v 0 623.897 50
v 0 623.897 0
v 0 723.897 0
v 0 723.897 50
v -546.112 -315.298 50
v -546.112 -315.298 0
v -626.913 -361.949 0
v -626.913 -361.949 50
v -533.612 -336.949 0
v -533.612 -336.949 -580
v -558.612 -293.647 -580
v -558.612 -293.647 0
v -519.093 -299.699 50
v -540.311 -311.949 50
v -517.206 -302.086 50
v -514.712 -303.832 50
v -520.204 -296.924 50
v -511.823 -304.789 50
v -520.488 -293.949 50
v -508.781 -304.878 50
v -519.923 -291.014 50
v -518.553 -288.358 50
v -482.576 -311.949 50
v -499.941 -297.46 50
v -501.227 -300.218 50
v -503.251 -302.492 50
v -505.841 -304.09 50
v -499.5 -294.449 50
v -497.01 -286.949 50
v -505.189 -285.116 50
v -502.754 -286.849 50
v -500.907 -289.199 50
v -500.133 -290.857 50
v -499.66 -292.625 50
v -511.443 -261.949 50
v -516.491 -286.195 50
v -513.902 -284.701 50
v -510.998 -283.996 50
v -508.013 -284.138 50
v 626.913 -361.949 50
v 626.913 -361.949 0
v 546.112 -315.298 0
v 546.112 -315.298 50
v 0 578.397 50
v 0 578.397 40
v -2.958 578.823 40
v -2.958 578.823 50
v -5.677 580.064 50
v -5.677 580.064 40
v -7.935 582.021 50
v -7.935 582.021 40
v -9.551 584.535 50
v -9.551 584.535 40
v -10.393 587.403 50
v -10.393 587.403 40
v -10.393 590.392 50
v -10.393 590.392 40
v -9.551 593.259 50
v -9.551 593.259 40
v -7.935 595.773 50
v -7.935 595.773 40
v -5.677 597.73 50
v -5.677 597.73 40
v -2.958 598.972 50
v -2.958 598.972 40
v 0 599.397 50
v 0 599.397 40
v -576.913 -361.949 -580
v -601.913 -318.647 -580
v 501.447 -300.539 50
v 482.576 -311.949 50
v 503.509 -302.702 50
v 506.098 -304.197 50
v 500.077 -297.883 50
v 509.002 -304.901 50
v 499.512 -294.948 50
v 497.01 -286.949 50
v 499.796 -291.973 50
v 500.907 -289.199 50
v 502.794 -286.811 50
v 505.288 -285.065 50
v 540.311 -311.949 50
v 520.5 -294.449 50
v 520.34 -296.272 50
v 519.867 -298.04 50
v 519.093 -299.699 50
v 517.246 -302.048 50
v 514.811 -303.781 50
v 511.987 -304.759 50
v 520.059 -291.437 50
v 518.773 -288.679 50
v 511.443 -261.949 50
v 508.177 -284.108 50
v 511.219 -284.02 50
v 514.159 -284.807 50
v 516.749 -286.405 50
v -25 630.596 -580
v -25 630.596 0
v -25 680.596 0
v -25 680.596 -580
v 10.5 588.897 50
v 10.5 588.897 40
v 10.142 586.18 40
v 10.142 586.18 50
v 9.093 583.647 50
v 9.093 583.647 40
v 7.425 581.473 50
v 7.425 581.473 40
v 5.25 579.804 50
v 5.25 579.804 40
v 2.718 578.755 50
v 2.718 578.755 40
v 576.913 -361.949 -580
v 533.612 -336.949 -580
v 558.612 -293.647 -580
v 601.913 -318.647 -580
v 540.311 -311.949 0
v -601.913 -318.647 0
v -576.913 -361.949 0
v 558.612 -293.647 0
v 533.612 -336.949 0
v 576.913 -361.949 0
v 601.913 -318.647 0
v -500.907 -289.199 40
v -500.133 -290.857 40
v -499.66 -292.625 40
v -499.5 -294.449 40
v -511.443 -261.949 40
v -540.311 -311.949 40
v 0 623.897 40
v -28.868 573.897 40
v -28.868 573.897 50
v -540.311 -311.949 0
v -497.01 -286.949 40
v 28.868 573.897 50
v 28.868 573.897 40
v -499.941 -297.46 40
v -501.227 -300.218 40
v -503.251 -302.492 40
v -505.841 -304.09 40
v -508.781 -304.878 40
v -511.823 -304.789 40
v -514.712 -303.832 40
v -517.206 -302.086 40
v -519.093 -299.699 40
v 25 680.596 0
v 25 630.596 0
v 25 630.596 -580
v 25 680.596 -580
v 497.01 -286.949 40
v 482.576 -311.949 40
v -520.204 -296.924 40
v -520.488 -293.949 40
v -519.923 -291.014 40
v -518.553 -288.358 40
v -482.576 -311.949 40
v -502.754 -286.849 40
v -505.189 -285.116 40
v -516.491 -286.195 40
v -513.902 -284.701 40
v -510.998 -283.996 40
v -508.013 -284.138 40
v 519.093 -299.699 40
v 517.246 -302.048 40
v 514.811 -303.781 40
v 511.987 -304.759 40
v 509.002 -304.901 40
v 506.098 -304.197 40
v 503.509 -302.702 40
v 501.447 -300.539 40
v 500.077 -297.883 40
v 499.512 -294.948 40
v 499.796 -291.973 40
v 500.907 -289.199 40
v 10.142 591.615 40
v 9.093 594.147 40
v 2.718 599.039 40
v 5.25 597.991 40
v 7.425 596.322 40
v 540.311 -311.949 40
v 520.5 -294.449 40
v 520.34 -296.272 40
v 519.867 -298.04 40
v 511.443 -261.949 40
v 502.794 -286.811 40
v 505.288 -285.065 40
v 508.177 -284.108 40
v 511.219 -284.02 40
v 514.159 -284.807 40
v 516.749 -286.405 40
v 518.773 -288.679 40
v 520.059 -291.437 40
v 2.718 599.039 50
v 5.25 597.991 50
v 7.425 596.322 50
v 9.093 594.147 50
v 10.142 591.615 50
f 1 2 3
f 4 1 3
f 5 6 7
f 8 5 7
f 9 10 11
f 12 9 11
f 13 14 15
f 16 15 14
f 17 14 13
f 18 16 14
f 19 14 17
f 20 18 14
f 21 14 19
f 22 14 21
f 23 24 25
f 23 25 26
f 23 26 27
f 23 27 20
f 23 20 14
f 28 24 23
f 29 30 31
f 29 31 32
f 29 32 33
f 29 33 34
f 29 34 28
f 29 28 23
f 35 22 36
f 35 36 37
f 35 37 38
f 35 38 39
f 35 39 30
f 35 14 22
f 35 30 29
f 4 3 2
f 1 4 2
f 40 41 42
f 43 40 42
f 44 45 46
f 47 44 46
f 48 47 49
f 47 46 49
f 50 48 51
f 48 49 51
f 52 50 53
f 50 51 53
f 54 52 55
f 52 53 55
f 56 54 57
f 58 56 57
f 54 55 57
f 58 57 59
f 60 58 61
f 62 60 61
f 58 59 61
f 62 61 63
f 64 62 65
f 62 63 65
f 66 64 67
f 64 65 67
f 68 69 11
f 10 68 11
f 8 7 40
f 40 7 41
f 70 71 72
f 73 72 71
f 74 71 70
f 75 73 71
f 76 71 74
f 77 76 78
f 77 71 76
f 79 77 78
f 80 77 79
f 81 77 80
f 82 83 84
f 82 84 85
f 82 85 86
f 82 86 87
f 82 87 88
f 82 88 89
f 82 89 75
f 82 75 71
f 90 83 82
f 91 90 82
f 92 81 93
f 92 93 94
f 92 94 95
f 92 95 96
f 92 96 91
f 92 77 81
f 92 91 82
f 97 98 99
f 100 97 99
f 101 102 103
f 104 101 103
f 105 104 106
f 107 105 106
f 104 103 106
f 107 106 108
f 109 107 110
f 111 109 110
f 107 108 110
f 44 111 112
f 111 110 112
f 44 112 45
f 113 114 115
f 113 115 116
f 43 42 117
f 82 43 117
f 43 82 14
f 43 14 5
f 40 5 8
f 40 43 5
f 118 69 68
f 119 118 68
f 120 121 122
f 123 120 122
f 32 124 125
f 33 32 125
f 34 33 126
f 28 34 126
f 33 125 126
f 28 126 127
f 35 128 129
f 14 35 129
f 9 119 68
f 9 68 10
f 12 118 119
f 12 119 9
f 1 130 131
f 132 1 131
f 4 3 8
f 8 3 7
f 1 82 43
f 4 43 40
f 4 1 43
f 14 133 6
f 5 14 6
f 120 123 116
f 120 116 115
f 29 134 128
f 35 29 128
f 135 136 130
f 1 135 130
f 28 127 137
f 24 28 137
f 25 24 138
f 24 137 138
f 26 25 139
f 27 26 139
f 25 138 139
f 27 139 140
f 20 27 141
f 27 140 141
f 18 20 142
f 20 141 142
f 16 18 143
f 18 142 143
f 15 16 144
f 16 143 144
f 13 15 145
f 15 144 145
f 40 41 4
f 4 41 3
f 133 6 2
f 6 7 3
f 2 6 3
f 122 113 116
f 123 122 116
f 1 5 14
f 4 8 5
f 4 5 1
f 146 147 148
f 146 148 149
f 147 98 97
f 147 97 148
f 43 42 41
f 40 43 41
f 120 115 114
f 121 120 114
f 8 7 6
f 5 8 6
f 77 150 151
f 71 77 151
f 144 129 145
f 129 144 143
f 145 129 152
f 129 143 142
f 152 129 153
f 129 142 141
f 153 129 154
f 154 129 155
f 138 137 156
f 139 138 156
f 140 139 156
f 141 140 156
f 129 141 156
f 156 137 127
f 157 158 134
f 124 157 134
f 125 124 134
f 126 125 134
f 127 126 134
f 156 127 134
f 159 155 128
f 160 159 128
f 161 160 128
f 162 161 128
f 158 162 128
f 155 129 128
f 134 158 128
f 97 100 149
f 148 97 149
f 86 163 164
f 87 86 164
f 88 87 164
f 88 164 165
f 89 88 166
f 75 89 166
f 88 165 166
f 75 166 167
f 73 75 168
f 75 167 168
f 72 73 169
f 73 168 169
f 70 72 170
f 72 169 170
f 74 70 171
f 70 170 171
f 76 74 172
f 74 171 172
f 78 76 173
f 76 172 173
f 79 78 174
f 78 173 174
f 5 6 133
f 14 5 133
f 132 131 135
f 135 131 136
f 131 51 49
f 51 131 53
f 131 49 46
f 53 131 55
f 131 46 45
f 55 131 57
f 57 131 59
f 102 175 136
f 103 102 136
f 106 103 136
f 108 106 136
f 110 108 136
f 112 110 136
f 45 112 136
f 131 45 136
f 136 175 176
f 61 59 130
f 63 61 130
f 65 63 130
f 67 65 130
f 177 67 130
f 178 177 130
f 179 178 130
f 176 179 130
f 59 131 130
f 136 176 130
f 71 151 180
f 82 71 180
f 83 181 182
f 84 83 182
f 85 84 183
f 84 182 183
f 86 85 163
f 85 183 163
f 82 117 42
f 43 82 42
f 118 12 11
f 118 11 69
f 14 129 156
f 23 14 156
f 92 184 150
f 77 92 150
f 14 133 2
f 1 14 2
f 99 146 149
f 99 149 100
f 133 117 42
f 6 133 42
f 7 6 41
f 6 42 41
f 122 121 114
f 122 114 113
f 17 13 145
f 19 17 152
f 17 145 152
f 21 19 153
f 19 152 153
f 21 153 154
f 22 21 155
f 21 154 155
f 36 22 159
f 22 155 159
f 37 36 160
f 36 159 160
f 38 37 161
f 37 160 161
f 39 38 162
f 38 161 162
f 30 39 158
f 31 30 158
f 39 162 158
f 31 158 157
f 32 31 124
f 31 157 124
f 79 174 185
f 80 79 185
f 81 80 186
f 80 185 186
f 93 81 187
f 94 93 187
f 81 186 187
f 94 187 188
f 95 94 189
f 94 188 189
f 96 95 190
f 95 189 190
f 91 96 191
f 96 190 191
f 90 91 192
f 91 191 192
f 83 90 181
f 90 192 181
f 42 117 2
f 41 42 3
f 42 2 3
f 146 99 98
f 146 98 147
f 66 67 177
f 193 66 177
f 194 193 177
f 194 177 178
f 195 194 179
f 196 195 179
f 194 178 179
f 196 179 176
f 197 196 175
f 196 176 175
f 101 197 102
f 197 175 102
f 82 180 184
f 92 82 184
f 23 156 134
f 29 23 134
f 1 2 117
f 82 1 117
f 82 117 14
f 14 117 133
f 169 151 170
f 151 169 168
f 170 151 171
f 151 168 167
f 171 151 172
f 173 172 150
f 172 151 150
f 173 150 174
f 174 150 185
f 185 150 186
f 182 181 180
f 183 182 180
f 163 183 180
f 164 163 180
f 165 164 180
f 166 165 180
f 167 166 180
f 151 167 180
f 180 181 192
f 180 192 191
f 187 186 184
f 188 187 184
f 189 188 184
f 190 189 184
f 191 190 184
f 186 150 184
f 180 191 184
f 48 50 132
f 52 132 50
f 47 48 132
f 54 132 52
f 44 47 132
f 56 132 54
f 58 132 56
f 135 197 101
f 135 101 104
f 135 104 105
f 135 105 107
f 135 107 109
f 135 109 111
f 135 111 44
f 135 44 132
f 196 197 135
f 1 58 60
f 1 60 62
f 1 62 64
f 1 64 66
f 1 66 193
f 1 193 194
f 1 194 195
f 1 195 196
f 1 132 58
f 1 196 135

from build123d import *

# Parameters (mm, degrees)
F0_W     = 25
F0_H     = 50
F1_DEPTH = 50
F2_DEPTH = 50
F3_DEPTH = 50
F4_START = 40
F4_DEPTH = 10
F5_START = 40
F5_DEPTH = 10
F6_START = 40
F6_DEPTH = 10
F7_DEPTH = 580
F8_DEPTH = 580
F9_DEPTH = 580


with BuildPart() as f1:
    # F0 (on Top) → F1 (new body)
    with BuildSketch(Plane.XY):
        Polygon((-589.413438675, -340.298007483), (-601.913438675, -318.6473723884), (-626.913438675, -361.9486425776), align=None)
        Polygon((-28.8675134595, 573.8972745734), (0, 623.8972745734), (0, 630.5960149659), (-25, 630.5960149659), (-25, 680.5960149659), (-601.913438675, -318.6473723884), (-558.6121684857, -293.6473723884), (-546.1121684857, -315.298007483), (-540.3108891325, -311.9486372867), (-511.443375673, -261.9486372867), align=None)
        Polygon((-25, 680.5960149659), (0, 680.5960149659), (0, 723.8972851552), align=None)
        with Locations((-12.5, 655.5960149659)):
            Rectangle(F0_W, F0_H)
        Polygon((-589.413438675, -340.298007483), (-546.1121684857, -315.298007483), (-558.6121684857, -293.6473723884), (-601.913438675, -318.6473723884), align=None)
    extrude(amount=F1_DEPTH)


with BuildPart() as f2:
    # F0 (on Top) → F2 (new body)
    with BuildSketch(Plane.XY):
        Polygon((0, 723.8972851552), (0, 680.5960149659), (25, 680.5960149659), align=None)
        Polygon((0, 630.5960149659), (0, 623.8972745734), (28.8675134595, 573.8972745734), (511.443375673, -261.9486372867), (540.3108891325, -311.9486372867), (546.1121684857, -315.298007483), (558.6121684857, -293.6473723884), (601.913438675, -318.6473723884), (25, 680.5960149659), (25, 630.5960149659), align=None)
        Polygon((626.913438675, -361.9486425776), (601.913438675, -318.6473723884), (589.413438675, -340.298007483), align=None)
        Polygon((558.6121684857, -293.6473723884), (546.1121684857, -315.298007483), (589.413438675, -340.298007483), (601.913438675, -318.6473723884), align=None)
        with Locations((12.5, 655.5960149659)):
            Rectangle(F0_W, F0_H)
    extrude(amount=F2_DEPTH)


with BuildPart() as f3:
    # F0 (on Top) → F3 (new body)
    with BuildSketch(Plane.XY):
        Polygon((626.913438675, -361.9486425776), (589.413438675, -340.298007483), (576.913438675, -361.9486425776), align=None)
        Polygon((546.1121684857, -315.298007483), (540.3108891325, -311.9486372867), (482.5758622135, -311.9486372867), (-482.5758622135, -311.9486372867), (-540.3108891325, -311.9486372867), (-546.1121684857, -315.298007483), (-533.6121684857, -336.9486425776), (-576.913438675, -361.9486425776), (576.913438675, -361.9486425776), (533.6121684857, -336.9486425776), align=None)
        Polygon((-576.913438675, -361.9486425776), (-589.413438675, -340.298007483), (-626.913438675, -361.9486425776), align=None)
        Polygon((589.413438675, -340.298007483), (546.1121684857, -315.298007483), (533.6121684857, -336.9486425776), (576.913438675, -361.9486425776), align=None)
        Polygon((-533.6121684857, -336.9486425776), (-546.1121684857, -315.298007483), (-589.413438675, -340.298007483), (-576.913438675, -361.9486425776), align=None)
    extrude(amount=F3_DEPTH)


with BuildPart() as f4:
    # F0 (on Top) → F4 (new body)
    with BuildSketch(Plane.XY.offset(F4_START)):
        with BuildLine():
            Line((0, 599.3972745734), (0, 623.8972745734))
            Line((0, 623.8972745734), (-28.8675134595, 573.8972745734))
            Line((-28.8675134595, 573.8972745734), (0, 573.8972745734))
            Line((0, 573.8972745734), (0, 578.3972745734))
            ThreePointArc((0, 578.3972745734), (-10.5, 588.8972745734), (0, 599.3972745734))
        make_face()
        with BuildLine():
            Line((28.8675134595, 573.8972745734), (0, 623.8972745734))
            Line((0, 623.8972745734), (0, 599.3972745734))
            ThreePointArc((0, 599.3972745734), (7.4246212025, 596.3218957759), (10.5, 588.8972745734))
            ThreePointArc((10.5, 588.8972745734), (7.4246212025, 581.472653371), (0, 578.3972745734))
            Line((0, 578.3972745734), (0, 573.8972745734))
            Line((0, 573.8972745734), (28.8675134595, 573.8972745734))
        make_face()
    extrude(amount=F4_DEPTH)


with BuildPart() as f5:
    # F0 (on Top) → F5 (new body)
    with BuildSketch(Plane.XY.offset(F5_START)):
        with BuildLine():
            Line((540.3108891325, -311.9486372867), (511.443375673, -261.9486372867))
            Line((511.443375673, -261.9486372867), (497.0096189432, -286.9486372867))
            Line((497.0096189432, -286.9486372867), (500.9067332603, -289.1986372867))
            ThreePointArc((500.9067332603, -289.1986372867), (512.7175999736, -284.3064161107), (520.5, -294.4486372867))
            ThreePointArc((520.5, -294.4486372867), (520.142221176, -297.1662372603), (519.0932667397, -299.6986372867))
            Line((519.0932667397, -299.6986372867), (540.3108891325, -311.9486372867))
        make_face()
        with BuildLine():
            Line((482.5758622135, -311.9486372867), (540.3108891325, -311.9486372867))
            Line((540.3108891325, -311.9486372867), (519.0932667397, -299.6986372867))
            ThreePointArc((519.0932667397, -299.6986372867), (504.75, -303.5419040264), (500.9067332603, -289.1986372867))
            Line((500.9067332603, -289.1986372867), (497.0096189432, -286.9486372867))
            Line((497.0096189432, -286.9486372867), (482.5758622135, -311.9486372867))
        make_face()
    extrude(amount=F5_DEPTH)


with BuildPart() as f6:
    # F0 (on Top) → F6 (new body)
    with BuildSketch(Plane.XY.offset(F6_START)):
        with BuildLine():
            Line((-497.0096189432, -286.9486372867), (-511.443375673, -261.9486372867))
            Line((-511.443375673, -261.9486372867), (-540.3108891325, -311.9486372867))
            Line((-540.3108891325, -311.9486372867), (-519.0932667397, -299.6986372867))
            ThreePointArc((-519.0932667397, -299.6986372867), (-515.25, -285.355370547), (-500.9067332603, -289.1986372867))
            Line((-500.9067332603, -289.1986372867), (-497.0096189432, -286.9486372867))
        make_face()
        with BuildLine():
            Line((-519.0932667397, -299.6986372867), (-540.3108891325, -311.9486372867))
            Line((-540.3108891325, -311.9486372867), (-482.5758622135, -311.9486372867))
            Line((-482.5758622135, -311.9486372867), (-497.0096189432, -286.9486372867))
            Line((-497.0096189432, -286.9486372867), (-500.9067332603, -289.1986372867))
            ThreePointArc((-500.9067332603, -289.1986372867), (-499.857778824, -291.7310373131), (-499.5, -294.4486372867))
            ThreePointArc((-499.5, -294.4486372867), (-507.2824000264, -304.5908584627), (-519.0932667397, -299.6986372867))
        make_face()
    extrude(amount=F6_DEPTH)


with BuildPart() as f7:
    # F0 (on Top) → F7 (new body)
    with BuildSketch(Plane.XY):
        Polygon((-589.413438675, -340.298007483), (-546.1121684857, -315.298007483), (-558.6121684857, -293.6473723884), (-601.913438675, -318.6473723884), align=None)
        Polygon((-533.6121684857, -336.9486425776), (-546.1121684857, -315.298007483), (-589.413438675, -340.298007483), (-576.913438675, -361.9486425776), align=None)
    extrude(amount=-F7_DEPTH)


with BuildPart() as f8:
    # F0 (on Top) → F8 (new body)
    with BuildSketch(Plane.XY):
        Polygon((589.413438675, -340.298007483), (546.1121684857, -315.298007483), (533.6121684857, -336.9486425776), (576.913438675, -361.9486425776), align=None)
        Polygon((558.6121684857, -293.6473723884), (546.1121684857, -315.298007483), (589.413438675, -340.298007483), (601.913438675, -318.6473723884), align=None)
    extrude(amount=-F8_DEPTH)


with BuildPart() as f9:
    # F0 (on Top) → F9 (new body)
    with BuildSketch(Plane.XY):
        with Locations((12.5, 655.5960149659)):
            Rectangle(F0_W, F0_H)
        with Locations((-12.5, 655.5960149659)):
            Rectangle(F0_W, F0_H)
    extrude(amount=-F9_DEPTH)


solid = Compound([f1.part, f2.part, f3.part, f4.part, f5.part, f6.part, f7.part, f8.part, f9.part])
